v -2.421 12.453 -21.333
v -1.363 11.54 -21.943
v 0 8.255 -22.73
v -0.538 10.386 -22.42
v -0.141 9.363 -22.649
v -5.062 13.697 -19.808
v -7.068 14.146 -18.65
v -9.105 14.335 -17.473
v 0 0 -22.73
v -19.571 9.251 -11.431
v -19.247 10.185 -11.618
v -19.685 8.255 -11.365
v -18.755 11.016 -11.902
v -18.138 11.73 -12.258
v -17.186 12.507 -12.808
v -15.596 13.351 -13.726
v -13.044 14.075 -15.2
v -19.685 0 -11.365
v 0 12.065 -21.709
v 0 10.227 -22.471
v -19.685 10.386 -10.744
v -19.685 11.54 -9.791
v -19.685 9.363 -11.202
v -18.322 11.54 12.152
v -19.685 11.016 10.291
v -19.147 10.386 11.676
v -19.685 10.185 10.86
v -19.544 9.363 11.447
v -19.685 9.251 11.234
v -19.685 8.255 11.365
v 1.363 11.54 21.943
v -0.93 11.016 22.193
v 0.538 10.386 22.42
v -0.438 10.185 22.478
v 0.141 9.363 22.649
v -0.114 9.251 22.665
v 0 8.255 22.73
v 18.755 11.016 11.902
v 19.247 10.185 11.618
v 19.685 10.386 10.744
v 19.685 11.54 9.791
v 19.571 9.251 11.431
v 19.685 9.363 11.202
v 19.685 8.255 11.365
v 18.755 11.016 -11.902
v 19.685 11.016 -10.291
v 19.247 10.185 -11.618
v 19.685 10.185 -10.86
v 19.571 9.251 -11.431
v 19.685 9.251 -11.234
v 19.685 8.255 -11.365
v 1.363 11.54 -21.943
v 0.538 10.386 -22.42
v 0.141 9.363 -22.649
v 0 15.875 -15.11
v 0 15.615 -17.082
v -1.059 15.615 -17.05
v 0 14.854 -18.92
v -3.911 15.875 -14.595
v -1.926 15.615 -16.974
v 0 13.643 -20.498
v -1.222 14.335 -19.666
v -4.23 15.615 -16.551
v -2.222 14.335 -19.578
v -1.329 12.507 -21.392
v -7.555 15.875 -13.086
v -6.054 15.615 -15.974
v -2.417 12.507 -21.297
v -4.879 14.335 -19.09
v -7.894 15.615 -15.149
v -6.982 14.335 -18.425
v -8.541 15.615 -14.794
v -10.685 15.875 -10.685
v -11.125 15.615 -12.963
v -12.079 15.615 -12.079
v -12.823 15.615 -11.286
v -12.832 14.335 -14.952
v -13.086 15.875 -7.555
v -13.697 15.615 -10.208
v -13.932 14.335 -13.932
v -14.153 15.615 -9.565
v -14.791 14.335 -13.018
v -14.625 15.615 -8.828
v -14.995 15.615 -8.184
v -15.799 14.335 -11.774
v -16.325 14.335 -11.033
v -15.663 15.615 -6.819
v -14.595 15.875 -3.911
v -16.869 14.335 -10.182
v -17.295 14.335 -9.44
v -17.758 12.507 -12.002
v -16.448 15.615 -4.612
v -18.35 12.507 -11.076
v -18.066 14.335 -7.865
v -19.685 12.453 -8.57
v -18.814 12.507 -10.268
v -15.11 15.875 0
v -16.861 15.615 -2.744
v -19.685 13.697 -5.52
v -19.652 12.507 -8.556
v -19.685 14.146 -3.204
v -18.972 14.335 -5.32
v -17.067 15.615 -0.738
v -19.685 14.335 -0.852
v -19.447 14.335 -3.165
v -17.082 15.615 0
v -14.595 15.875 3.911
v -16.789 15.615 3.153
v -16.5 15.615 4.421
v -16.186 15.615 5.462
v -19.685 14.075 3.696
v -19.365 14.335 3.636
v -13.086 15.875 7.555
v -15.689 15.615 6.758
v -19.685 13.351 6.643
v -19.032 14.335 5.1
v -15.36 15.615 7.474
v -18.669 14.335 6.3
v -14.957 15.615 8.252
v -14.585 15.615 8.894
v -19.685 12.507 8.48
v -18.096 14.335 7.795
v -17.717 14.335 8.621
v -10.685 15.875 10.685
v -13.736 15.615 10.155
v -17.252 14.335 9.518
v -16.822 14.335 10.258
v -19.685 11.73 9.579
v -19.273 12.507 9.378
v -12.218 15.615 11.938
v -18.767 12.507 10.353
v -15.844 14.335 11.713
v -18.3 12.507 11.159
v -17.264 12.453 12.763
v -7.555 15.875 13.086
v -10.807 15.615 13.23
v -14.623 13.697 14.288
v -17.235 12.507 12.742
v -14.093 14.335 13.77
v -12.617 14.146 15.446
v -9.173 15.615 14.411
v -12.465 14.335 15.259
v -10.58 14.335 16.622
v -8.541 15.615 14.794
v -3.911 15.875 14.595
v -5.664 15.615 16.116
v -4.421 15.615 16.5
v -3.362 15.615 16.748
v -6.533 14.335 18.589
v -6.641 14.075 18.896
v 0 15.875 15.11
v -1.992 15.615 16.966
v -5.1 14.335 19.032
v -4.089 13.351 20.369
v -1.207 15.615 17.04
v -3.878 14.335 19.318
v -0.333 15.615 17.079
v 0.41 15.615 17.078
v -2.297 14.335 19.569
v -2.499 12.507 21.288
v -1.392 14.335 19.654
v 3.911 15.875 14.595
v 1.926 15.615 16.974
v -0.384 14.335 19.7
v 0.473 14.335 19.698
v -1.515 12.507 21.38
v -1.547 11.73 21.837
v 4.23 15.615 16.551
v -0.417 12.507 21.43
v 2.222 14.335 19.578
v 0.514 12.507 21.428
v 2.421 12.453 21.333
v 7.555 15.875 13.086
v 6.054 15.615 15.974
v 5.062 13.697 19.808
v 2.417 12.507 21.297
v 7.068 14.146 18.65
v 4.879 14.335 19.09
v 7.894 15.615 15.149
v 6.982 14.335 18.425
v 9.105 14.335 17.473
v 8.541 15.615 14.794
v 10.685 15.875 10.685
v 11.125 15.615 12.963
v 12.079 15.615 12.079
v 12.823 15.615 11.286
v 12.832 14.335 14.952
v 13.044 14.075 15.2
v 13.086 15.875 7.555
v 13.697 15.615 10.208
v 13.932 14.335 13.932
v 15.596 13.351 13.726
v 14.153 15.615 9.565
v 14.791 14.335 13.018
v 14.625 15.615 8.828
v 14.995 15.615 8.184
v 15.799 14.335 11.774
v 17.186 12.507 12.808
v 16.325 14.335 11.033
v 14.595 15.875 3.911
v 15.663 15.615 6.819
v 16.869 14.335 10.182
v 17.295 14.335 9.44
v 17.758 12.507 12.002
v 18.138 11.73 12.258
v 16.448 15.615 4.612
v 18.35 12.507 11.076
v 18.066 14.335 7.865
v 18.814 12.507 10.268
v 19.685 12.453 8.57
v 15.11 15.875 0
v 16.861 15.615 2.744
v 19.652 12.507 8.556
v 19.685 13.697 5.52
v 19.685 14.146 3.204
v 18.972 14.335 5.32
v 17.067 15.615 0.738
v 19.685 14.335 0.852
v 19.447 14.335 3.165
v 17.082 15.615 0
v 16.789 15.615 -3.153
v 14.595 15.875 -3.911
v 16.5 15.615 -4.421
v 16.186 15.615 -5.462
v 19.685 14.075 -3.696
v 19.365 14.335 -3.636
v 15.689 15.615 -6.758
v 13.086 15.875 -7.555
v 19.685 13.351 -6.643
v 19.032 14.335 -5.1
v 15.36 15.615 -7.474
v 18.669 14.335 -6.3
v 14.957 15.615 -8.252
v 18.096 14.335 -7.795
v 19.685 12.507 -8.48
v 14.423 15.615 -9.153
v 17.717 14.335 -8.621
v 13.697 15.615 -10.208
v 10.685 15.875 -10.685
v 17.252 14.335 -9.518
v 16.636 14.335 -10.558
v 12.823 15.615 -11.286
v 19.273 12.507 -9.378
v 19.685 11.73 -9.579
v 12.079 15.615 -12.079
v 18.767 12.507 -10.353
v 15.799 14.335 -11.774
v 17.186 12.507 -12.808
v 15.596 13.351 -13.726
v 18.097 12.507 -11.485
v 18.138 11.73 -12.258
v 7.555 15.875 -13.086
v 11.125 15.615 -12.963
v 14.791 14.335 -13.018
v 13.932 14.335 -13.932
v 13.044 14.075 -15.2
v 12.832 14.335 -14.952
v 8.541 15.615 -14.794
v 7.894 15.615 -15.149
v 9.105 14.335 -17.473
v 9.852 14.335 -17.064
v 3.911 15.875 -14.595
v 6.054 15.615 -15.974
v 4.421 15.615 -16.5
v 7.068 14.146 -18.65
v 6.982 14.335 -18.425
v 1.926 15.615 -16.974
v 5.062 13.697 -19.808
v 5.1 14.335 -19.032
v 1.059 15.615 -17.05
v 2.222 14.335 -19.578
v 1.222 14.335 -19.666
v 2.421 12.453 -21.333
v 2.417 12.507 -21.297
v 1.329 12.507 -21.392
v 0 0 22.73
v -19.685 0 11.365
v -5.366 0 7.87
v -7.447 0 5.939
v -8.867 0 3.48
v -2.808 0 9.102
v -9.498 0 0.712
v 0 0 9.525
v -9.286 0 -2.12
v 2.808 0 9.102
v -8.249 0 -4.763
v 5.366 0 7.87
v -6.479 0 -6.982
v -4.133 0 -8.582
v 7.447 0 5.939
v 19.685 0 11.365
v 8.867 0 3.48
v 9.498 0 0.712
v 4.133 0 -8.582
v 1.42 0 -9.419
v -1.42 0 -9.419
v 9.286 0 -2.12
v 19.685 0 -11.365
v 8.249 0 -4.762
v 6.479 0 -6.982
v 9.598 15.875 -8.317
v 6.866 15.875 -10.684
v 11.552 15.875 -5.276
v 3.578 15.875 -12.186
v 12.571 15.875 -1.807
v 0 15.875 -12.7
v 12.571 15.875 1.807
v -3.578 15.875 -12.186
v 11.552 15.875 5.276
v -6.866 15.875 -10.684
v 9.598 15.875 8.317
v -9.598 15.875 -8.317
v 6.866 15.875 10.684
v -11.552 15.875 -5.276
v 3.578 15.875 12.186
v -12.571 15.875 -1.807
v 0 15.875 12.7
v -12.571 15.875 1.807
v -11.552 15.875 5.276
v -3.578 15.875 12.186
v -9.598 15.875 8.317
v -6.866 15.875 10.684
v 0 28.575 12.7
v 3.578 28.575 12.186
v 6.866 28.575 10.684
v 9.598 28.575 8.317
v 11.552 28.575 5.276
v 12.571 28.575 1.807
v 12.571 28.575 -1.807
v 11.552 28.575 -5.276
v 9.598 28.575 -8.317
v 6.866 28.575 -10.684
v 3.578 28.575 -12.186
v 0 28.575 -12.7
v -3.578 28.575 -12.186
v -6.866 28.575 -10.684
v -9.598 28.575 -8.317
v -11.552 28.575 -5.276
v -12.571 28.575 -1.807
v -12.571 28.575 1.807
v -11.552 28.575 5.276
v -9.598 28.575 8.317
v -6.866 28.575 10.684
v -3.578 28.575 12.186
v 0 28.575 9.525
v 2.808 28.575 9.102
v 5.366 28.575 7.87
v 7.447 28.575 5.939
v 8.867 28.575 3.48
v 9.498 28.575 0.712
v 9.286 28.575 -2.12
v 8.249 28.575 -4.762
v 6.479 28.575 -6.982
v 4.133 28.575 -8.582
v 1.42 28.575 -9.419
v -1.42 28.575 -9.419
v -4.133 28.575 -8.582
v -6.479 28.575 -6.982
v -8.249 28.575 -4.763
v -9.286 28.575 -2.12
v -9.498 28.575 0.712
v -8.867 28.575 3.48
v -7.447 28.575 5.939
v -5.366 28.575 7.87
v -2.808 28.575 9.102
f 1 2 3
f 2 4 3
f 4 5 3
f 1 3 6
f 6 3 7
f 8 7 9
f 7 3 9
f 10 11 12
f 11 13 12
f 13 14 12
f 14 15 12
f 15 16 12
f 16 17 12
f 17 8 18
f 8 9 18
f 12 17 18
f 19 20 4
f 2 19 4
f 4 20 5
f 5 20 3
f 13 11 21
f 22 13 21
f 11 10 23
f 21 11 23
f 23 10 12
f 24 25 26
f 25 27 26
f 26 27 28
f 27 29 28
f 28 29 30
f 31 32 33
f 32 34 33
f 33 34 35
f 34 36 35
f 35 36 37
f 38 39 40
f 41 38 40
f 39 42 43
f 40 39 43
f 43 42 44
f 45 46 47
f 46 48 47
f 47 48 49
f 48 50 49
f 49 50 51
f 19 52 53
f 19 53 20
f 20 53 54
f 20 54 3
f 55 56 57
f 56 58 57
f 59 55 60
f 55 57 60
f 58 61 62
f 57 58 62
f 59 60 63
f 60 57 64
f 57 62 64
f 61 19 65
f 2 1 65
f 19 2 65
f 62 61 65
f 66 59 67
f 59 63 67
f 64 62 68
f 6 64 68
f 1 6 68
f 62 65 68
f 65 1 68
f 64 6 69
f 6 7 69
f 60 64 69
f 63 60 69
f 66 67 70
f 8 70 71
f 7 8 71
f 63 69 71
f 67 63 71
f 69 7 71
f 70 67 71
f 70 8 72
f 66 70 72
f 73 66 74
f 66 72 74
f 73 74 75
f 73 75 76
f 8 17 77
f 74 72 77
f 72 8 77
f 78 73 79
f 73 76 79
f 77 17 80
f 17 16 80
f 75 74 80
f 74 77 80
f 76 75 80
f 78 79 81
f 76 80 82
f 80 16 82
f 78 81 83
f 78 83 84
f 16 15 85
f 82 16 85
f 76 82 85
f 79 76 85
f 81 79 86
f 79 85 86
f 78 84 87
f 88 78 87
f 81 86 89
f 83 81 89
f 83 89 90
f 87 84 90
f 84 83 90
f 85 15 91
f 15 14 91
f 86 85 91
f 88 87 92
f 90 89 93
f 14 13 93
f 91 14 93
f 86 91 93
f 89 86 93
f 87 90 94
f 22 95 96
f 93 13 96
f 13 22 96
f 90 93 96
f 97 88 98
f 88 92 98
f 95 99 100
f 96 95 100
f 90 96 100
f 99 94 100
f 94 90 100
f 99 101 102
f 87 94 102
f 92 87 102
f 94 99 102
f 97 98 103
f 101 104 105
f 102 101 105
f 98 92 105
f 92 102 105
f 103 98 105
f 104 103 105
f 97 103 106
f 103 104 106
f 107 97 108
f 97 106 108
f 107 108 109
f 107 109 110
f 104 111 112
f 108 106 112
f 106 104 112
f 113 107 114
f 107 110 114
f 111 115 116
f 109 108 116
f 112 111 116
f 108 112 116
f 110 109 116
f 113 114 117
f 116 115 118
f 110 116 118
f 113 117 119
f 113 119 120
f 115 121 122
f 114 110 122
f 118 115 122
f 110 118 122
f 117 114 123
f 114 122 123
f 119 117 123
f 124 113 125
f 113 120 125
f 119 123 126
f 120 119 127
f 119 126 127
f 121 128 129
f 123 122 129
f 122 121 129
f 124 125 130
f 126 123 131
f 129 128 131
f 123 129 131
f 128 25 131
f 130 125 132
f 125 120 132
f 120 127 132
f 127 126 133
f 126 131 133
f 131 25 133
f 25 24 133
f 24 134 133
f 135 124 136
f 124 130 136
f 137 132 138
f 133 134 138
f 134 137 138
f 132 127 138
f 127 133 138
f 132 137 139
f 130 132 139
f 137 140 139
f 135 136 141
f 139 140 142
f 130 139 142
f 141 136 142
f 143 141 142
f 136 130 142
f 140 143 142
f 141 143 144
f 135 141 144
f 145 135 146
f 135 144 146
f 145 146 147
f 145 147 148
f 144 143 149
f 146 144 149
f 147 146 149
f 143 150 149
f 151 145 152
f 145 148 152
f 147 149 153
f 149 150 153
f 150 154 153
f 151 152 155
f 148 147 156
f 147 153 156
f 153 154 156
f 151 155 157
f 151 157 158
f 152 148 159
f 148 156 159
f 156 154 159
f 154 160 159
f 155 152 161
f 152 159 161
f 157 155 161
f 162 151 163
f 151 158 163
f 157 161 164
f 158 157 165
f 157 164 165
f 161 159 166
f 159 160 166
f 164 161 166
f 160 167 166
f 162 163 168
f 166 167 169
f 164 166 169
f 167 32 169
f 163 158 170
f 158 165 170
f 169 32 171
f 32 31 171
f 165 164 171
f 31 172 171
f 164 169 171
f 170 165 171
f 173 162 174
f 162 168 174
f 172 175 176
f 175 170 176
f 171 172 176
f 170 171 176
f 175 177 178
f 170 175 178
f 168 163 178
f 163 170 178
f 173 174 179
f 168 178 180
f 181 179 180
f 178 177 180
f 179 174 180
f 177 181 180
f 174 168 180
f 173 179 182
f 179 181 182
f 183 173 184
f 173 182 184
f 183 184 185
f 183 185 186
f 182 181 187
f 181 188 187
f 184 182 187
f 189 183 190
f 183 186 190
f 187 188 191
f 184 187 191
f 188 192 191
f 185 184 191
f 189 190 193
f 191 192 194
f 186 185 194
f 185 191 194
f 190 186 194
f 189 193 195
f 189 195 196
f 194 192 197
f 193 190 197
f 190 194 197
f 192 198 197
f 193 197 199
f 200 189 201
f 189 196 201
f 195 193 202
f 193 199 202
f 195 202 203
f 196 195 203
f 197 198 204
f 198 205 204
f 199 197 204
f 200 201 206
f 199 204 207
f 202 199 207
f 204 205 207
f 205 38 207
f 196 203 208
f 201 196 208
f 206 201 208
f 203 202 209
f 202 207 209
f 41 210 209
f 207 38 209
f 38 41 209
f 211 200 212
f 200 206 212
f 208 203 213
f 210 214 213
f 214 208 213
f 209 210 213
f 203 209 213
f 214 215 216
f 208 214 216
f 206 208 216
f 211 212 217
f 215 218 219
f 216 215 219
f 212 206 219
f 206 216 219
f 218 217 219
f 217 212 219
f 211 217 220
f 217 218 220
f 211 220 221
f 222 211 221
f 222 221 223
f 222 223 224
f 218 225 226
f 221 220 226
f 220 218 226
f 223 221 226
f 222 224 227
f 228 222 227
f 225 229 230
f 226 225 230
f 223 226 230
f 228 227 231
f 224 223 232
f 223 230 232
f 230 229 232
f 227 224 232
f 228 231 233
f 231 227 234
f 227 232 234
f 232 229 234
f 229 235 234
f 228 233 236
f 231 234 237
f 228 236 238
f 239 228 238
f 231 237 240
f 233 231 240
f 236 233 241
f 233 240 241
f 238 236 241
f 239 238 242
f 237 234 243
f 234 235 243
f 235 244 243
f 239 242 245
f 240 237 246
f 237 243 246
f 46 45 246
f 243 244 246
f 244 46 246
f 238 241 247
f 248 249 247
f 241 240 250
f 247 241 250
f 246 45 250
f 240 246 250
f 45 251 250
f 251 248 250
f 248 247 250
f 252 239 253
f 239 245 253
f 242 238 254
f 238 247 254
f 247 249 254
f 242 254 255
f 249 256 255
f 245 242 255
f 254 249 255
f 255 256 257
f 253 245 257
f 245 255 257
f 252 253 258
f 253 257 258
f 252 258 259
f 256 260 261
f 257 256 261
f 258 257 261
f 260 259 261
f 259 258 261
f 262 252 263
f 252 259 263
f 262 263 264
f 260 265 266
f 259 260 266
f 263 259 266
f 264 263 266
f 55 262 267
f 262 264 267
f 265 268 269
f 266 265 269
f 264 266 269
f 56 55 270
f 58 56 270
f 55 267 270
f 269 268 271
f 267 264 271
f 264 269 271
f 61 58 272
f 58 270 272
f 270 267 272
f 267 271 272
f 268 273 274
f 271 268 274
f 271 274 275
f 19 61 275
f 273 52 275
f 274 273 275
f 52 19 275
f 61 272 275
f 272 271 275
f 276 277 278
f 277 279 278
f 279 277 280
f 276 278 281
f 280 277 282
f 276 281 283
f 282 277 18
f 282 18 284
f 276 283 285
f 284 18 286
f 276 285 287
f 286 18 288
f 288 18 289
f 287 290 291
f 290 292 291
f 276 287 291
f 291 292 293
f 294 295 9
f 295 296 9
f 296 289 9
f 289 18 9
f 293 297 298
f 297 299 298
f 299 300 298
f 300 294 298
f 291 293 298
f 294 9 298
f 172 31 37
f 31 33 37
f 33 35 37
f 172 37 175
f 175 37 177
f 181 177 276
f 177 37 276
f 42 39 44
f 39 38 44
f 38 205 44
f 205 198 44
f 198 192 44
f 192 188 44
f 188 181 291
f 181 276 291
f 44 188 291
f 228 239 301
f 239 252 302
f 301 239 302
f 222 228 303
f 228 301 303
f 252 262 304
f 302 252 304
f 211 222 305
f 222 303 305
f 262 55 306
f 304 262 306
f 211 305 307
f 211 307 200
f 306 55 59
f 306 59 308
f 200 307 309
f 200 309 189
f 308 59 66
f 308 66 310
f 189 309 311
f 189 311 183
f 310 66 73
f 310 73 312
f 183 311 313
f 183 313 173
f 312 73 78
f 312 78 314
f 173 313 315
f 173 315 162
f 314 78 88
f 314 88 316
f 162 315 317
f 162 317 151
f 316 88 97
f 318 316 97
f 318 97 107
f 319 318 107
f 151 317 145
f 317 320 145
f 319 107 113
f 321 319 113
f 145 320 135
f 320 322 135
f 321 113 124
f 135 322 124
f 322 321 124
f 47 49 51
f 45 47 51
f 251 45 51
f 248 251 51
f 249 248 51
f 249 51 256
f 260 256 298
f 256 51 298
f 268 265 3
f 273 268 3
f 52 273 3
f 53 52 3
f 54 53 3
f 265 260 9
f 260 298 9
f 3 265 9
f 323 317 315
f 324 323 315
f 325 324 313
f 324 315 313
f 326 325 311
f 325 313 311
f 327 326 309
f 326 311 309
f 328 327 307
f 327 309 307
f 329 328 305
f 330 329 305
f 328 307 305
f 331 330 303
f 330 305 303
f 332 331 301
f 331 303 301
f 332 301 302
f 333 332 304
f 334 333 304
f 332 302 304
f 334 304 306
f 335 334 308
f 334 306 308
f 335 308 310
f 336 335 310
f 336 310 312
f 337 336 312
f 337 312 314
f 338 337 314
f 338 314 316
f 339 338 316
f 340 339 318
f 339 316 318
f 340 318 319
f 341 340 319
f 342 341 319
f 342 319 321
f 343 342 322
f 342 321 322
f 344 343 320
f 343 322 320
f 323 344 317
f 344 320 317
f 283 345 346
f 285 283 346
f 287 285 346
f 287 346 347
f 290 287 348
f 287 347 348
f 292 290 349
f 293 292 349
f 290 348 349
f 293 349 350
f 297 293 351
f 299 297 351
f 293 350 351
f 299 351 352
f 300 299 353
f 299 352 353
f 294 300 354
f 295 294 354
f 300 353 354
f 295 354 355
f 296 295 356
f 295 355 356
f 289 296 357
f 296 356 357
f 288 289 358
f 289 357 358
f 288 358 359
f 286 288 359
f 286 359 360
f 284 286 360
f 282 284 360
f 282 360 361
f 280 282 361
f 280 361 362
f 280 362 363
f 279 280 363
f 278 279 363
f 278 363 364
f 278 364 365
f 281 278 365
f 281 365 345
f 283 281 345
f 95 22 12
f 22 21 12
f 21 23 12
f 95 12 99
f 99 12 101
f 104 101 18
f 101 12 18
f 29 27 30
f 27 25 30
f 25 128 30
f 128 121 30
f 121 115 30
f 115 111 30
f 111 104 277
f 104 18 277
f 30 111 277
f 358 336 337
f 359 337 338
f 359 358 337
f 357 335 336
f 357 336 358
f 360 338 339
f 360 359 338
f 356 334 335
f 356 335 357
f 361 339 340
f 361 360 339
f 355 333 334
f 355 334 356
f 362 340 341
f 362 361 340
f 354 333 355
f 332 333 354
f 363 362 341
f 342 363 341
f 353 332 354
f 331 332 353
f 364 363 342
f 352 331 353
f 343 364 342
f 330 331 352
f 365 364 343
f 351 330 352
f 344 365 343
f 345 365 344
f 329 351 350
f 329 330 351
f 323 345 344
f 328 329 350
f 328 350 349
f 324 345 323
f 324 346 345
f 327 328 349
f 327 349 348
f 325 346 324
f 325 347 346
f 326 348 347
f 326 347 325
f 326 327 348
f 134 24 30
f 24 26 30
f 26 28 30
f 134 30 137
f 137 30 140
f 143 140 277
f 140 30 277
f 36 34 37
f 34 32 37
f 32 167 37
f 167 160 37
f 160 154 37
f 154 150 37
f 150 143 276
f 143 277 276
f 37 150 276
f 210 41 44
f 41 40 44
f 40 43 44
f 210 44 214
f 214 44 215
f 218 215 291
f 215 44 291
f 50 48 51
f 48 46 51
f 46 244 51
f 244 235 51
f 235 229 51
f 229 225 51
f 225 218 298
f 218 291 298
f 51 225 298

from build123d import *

# Parameters (mm, degrees)
BOSS_EXTRUDE1_DEPTH = 15.875
SKETCH3_R           = 12.7
BOSS_EXTRUDE2_DEPTH = 12.7
SKETCH4_R           = 9.525
CUT_EXTRUDE1_DEPTH  = 42.481266827


with BuildPart() as part:
    # Sketch1 → Boss-Extrude1 (new body)
    with BuildSketch(Plane(origin=(0, 0, 0), x_dir=(1, 0, 0), z_dir=(0, 1, 0))):
        Polygon((19.685, -11.365140049), (19.685, 11.365140049), (0, 22.730280098), (-19.685, 11.365140049), (-19.685, -11.365140049), (0, -22.730280098), align=None)
    extrude(amount=BOSS_EXTRUDE1_DEPTH)

    # Sketch2 → Cut-Revolve1 (revolve, cut)
    with BuildSketch(Plane(origin=(0, 0, 0), x_dir=(0, 0, -1), z_dir=(1, 0, 0))):
        with BuildLine():
            Line((22.730280098, 0), (28.475559527, 0))
            Line((28.475559527, 0), (28.475559527, 20.473836959))
            Line((28.475559527, 20.473836959), (11.365140049, 20.473836959))
            Line((11.365140049, 20.473836959), (11.365140049, 15.875))
            Line((11.365140049, 15.875), (15.110280098, 15.875))
            ThreePointArc((15.110280098, 15.875), (20.498433771, 13.643153673), (22.730280098, 8.255))
            Line((22.730280098, 8.255), (22.730280098, 0))
        make_face()
    revolve(axis=Axis((0, 0, 0), (0, 1, 0)), mode=Mode.SUBTRACT)

    # Sketch3 → Boss-Extrude2 (add)
    with BuildSketch(Plane(origin=(0, 15.875, 0), x_dir=(1, 0, 0), z_dir=(0, 1, 0))):
        with Locations(Location((0, 0, 0), (0, 0, 270))):
            Circle(SKETCH3_R)
    extrude(amount=BOSS_EXTRUDE2_DEPTH)

    # Sketch4 → Cut-Extrude1 (cut, through all)
    with BuildSketch(Plane(origin=(0, 28.575, 0), x_dir=(1, 0, 0), z_dir=(0, 1, 0))):
        with Locations(Location((0, 0, 0), (0, 0, 270))):
            Circle(SKETCH4_R)
    extrude(amount=-CUT_EXTRUDE1_DEPTH, mode=Mode.SUBTRACT)


solid = part.part
